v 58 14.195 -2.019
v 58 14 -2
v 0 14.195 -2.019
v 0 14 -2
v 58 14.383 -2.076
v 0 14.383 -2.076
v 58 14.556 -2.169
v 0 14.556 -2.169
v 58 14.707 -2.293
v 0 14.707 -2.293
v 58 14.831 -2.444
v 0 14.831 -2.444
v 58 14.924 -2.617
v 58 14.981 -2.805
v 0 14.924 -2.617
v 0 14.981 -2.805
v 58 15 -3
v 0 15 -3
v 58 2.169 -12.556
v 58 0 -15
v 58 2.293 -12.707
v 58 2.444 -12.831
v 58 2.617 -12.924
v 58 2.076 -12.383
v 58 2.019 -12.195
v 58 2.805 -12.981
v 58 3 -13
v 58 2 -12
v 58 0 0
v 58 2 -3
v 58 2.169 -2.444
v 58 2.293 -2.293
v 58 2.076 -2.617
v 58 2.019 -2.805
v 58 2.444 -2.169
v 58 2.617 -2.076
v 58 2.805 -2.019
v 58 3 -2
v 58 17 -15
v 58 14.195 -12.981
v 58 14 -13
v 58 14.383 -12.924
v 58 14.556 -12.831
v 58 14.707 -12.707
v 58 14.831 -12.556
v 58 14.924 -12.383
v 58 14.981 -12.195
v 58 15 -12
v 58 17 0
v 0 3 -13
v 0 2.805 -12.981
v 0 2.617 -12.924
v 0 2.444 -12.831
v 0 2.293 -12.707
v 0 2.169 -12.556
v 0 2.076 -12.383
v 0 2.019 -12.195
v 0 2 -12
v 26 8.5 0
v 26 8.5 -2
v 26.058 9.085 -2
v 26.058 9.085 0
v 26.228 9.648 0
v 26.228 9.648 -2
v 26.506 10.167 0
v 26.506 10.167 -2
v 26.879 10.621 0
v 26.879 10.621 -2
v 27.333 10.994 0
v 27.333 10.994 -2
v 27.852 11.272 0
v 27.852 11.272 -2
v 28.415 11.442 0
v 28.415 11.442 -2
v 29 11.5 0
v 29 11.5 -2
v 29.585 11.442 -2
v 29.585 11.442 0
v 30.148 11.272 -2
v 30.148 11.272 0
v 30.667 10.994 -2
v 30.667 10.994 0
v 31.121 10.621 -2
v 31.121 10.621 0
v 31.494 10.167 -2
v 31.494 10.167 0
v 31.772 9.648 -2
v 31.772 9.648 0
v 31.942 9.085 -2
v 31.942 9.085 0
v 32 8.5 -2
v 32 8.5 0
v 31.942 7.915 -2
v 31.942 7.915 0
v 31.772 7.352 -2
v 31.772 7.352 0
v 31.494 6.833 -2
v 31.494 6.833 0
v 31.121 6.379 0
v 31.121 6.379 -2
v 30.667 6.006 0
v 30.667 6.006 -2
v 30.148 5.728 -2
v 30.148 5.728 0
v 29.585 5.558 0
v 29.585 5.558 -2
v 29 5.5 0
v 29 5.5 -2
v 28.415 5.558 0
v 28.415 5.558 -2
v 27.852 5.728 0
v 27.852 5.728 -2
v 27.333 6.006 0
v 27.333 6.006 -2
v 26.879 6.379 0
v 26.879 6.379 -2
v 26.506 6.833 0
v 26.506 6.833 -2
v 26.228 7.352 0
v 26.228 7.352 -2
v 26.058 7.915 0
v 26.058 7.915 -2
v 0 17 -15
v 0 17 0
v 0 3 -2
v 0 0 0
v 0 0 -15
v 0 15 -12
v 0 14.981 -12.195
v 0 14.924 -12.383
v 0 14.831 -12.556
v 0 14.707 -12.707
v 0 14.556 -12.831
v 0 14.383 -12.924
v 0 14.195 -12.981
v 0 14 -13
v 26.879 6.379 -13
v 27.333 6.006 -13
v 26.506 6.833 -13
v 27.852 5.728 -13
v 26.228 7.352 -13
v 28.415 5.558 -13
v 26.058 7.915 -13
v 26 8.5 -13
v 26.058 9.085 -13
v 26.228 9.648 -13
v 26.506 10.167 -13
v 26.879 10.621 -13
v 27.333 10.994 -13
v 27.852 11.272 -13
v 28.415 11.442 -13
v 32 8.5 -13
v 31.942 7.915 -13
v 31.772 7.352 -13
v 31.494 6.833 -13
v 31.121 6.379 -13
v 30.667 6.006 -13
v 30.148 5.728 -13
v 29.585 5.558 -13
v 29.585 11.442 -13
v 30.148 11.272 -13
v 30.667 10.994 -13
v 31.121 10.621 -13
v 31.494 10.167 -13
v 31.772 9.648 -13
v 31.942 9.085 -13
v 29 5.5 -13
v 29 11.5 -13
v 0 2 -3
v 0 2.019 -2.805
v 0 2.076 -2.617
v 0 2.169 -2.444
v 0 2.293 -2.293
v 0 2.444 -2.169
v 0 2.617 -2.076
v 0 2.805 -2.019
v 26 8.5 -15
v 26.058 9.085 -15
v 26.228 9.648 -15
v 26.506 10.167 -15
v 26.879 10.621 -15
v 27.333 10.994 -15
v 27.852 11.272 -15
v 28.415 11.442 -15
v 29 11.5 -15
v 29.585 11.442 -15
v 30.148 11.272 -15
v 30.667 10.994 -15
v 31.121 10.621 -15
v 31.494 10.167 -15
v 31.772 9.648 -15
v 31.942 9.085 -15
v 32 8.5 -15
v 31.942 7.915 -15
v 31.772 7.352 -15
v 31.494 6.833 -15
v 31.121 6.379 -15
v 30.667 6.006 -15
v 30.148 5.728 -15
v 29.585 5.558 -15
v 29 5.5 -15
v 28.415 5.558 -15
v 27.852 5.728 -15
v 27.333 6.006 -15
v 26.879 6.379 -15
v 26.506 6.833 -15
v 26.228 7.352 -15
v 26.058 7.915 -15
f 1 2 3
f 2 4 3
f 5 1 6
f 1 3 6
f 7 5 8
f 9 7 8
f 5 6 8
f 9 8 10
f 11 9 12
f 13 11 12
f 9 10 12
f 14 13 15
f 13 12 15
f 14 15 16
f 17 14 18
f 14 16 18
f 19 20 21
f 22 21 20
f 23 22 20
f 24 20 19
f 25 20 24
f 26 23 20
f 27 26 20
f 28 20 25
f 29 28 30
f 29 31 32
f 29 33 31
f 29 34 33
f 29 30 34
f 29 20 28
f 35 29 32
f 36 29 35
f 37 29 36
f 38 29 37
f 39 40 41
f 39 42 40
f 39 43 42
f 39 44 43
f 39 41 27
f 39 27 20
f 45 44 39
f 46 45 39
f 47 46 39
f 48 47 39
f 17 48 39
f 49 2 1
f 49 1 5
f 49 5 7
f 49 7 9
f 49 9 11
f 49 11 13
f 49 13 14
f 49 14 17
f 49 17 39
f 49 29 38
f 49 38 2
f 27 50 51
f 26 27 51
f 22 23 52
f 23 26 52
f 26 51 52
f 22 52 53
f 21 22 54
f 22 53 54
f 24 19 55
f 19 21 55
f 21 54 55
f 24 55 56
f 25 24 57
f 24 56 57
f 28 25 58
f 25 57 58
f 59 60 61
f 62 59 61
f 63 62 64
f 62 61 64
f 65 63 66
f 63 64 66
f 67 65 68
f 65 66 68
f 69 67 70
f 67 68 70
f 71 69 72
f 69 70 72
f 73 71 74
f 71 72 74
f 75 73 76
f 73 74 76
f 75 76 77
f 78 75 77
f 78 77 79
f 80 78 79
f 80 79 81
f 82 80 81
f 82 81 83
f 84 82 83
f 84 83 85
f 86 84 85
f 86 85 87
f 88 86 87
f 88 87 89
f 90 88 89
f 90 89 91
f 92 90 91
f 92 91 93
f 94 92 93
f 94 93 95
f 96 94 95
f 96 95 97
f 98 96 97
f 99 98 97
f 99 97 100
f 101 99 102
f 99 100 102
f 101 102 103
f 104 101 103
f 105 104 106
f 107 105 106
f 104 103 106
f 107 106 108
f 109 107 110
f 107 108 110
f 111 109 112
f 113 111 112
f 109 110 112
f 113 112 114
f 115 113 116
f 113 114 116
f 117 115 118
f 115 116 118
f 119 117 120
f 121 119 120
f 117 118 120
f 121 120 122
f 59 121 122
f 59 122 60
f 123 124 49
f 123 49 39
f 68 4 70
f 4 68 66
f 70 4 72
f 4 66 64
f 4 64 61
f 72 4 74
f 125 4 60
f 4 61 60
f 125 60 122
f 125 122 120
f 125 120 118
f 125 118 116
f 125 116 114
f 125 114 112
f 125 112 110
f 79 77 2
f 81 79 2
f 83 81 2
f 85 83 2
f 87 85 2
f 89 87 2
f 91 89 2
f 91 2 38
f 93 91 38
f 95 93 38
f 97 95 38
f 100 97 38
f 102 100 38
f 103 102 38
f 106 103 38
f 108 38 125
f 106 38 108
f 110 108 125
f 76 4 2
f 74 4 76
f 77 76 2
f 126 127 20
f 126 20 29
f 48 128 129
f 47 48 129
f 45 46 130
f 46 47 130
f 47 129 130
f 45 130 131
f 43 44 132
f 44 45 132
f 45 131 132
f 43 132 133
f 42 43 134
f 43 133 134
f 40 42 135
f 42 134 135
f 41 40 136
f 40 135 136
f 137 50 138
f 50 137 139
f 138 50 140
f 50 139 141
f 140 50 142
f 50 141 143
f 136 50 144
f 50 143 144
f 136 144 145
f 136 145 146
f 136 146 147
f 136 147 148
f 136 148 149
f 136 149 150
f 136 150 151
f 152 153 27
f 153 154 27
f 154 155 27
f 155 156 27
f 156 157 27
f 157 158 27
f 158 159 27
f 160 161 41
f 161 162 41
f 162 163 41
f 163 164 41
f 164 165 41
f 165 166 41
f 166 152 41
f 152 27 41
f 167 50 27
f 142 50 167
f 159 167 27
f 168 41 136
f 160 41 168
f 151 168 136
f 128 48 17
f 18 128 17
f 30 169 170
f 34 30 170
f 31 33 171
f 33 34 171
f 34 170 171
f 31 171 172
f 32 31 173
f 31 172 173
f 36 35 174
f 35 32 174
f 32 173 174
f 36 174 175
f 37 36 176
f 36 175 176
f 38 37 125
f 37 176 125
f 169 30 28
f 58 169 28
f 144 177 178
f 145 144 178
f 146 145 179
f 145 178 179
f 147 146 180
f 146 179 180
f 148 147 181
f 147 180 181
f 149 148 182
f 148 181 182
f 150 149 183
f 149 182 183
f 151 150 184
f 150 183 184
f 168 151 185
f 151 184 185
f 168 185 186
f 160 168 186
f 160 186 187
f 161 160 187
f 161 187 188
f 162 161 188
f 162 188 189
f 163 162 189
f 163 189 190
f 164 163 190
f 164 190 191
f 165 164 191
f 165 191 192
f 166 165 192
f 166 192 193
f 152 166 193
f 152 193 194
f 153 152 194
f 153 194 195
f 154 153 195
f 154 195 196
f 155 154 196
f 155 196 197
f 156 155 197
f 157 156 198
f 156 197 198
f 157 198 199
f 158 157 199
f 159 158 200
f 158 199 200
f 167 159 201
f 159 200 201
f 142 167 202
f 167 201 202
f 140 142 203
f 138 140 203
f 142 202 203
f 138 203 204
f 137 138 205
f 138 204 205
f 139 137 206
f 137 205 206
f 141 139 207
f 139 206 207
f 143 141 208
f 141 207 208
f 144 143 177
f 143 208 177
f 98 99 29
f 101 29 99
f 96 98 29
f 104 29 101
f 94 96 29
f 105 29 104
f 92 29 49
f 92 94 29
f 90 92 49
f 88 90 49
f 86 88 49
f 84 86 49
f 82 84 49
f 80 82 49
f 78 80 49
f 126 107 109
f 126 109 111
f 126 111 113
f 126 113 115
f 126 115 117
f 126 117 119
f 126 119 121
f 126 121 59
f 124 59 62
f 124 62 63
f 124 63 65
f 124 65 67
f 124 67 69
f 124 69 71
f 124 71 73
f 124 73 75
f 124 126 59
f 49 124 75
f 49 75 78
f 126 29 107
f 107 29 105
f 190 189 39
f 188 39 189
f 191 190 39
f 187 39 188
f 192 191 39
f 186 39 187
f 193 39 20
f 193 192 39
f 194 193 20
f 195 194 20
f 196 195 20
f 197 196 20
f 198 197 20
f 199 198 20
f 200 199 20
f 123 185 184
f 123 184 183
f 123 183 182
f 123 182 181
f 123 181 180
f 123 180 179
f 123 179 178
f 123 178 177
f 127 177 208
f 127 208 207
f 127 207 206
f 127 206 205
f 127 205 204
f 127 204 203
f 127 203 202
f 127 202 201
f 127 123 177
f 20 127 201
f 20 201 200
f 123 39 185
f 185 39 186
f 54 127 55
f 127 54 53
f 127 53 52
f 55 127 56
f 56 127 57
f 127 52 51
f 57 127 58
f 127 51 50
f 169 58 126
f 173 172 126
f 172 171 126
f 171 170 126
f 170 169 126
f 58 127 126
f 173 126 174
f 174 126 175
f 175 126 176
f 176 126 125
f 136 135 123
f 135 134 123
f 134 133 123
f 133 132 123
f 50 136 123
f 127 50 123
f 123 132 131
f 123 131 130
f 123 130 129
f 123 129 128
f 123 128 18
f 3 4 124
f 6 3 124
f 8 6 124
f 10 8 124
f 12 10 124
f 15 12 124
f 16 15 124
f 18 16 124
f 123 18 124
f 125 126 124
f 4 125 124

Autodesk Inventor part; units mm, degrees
ref_plane "YZ Plane" through (0, 0, 0) normal (1, 0, 0) x (0, 1, 0)
ref_plane "XZ Plane" through (0, 0, 0) normal (0, 1, 0) x (-1, 0, 0)
ref_plane "XY Plane" through (0, 0, 0) normal (0, 0, 1) x (1, 0, 0)
sketch "Sketch2" plane through (0, 0, 0) normal (1, 0, 0) x (0, 1, 0)
  line L0 (0, 0) -> (17, 0)
  line L1 (17, 0) -> (17, -15)
  line L2 (17, -15) -> (0, -15)
  line L3 (0, -15) -> (0, 0)
  dimension "d4" = 17
  dimension "d5" = 15
extrude "Extrusion2" add sketch "Sketch2" along normal blind 58
sketch "Sketch3" plane through (58, 0, 0) normal (1, 0, 0) x (0, 0, -1)
  line L0 (0, 17) -> (0, 0) projected
  line L1 (0, 0) -> (15, 0) projected
  line L2 (15, 0) -> (15, 17) projected
  line L3 (2, 2) -> (13, 2)
  line L4 (13, 2) -> (13, 15)
  line L5 (13, 15) -> (2, 15)
  line L6 (2, 15) -> (2, 2)
  line L7 (2, 2) -> (13, 15) construction
  line L8 (13, 2) -> (2, 15) construction
  point P0 (7.5, 8.5)
  dimension "d9" = 11
  dimension "d10" = 13
extrude "Extrusion3" cut sketch "Sketch3" against normal through all
sketch "Sketch5" plane through (0, 0, -15) normal (0, 0, -1) x (-1, 0, 0)
  line L0 (0, 0) -> (-58, 0) projected
  line L1 (-58, 0) -> (0, 17)
  line L2 (-58, 0) -> (-58, 17) projected
  line L3 (0, 0) -> (-58, 17)
  circle A0 centre (-29, 8.5) radius 3
  dimension "d13" = 6
extrude "Extrusion4" cut sketch "Sketch5" against normal through all contours A0 L1 L3 | L3 L1 A0 | A0 L3 L1 | L3 A0 L1
fillet "Fillet1" radius 1 4 edges at (29, 2, -13) (29, 2, -2) (29, 15, -2) (29, 15, -13)
properties part number "caja perfil"
